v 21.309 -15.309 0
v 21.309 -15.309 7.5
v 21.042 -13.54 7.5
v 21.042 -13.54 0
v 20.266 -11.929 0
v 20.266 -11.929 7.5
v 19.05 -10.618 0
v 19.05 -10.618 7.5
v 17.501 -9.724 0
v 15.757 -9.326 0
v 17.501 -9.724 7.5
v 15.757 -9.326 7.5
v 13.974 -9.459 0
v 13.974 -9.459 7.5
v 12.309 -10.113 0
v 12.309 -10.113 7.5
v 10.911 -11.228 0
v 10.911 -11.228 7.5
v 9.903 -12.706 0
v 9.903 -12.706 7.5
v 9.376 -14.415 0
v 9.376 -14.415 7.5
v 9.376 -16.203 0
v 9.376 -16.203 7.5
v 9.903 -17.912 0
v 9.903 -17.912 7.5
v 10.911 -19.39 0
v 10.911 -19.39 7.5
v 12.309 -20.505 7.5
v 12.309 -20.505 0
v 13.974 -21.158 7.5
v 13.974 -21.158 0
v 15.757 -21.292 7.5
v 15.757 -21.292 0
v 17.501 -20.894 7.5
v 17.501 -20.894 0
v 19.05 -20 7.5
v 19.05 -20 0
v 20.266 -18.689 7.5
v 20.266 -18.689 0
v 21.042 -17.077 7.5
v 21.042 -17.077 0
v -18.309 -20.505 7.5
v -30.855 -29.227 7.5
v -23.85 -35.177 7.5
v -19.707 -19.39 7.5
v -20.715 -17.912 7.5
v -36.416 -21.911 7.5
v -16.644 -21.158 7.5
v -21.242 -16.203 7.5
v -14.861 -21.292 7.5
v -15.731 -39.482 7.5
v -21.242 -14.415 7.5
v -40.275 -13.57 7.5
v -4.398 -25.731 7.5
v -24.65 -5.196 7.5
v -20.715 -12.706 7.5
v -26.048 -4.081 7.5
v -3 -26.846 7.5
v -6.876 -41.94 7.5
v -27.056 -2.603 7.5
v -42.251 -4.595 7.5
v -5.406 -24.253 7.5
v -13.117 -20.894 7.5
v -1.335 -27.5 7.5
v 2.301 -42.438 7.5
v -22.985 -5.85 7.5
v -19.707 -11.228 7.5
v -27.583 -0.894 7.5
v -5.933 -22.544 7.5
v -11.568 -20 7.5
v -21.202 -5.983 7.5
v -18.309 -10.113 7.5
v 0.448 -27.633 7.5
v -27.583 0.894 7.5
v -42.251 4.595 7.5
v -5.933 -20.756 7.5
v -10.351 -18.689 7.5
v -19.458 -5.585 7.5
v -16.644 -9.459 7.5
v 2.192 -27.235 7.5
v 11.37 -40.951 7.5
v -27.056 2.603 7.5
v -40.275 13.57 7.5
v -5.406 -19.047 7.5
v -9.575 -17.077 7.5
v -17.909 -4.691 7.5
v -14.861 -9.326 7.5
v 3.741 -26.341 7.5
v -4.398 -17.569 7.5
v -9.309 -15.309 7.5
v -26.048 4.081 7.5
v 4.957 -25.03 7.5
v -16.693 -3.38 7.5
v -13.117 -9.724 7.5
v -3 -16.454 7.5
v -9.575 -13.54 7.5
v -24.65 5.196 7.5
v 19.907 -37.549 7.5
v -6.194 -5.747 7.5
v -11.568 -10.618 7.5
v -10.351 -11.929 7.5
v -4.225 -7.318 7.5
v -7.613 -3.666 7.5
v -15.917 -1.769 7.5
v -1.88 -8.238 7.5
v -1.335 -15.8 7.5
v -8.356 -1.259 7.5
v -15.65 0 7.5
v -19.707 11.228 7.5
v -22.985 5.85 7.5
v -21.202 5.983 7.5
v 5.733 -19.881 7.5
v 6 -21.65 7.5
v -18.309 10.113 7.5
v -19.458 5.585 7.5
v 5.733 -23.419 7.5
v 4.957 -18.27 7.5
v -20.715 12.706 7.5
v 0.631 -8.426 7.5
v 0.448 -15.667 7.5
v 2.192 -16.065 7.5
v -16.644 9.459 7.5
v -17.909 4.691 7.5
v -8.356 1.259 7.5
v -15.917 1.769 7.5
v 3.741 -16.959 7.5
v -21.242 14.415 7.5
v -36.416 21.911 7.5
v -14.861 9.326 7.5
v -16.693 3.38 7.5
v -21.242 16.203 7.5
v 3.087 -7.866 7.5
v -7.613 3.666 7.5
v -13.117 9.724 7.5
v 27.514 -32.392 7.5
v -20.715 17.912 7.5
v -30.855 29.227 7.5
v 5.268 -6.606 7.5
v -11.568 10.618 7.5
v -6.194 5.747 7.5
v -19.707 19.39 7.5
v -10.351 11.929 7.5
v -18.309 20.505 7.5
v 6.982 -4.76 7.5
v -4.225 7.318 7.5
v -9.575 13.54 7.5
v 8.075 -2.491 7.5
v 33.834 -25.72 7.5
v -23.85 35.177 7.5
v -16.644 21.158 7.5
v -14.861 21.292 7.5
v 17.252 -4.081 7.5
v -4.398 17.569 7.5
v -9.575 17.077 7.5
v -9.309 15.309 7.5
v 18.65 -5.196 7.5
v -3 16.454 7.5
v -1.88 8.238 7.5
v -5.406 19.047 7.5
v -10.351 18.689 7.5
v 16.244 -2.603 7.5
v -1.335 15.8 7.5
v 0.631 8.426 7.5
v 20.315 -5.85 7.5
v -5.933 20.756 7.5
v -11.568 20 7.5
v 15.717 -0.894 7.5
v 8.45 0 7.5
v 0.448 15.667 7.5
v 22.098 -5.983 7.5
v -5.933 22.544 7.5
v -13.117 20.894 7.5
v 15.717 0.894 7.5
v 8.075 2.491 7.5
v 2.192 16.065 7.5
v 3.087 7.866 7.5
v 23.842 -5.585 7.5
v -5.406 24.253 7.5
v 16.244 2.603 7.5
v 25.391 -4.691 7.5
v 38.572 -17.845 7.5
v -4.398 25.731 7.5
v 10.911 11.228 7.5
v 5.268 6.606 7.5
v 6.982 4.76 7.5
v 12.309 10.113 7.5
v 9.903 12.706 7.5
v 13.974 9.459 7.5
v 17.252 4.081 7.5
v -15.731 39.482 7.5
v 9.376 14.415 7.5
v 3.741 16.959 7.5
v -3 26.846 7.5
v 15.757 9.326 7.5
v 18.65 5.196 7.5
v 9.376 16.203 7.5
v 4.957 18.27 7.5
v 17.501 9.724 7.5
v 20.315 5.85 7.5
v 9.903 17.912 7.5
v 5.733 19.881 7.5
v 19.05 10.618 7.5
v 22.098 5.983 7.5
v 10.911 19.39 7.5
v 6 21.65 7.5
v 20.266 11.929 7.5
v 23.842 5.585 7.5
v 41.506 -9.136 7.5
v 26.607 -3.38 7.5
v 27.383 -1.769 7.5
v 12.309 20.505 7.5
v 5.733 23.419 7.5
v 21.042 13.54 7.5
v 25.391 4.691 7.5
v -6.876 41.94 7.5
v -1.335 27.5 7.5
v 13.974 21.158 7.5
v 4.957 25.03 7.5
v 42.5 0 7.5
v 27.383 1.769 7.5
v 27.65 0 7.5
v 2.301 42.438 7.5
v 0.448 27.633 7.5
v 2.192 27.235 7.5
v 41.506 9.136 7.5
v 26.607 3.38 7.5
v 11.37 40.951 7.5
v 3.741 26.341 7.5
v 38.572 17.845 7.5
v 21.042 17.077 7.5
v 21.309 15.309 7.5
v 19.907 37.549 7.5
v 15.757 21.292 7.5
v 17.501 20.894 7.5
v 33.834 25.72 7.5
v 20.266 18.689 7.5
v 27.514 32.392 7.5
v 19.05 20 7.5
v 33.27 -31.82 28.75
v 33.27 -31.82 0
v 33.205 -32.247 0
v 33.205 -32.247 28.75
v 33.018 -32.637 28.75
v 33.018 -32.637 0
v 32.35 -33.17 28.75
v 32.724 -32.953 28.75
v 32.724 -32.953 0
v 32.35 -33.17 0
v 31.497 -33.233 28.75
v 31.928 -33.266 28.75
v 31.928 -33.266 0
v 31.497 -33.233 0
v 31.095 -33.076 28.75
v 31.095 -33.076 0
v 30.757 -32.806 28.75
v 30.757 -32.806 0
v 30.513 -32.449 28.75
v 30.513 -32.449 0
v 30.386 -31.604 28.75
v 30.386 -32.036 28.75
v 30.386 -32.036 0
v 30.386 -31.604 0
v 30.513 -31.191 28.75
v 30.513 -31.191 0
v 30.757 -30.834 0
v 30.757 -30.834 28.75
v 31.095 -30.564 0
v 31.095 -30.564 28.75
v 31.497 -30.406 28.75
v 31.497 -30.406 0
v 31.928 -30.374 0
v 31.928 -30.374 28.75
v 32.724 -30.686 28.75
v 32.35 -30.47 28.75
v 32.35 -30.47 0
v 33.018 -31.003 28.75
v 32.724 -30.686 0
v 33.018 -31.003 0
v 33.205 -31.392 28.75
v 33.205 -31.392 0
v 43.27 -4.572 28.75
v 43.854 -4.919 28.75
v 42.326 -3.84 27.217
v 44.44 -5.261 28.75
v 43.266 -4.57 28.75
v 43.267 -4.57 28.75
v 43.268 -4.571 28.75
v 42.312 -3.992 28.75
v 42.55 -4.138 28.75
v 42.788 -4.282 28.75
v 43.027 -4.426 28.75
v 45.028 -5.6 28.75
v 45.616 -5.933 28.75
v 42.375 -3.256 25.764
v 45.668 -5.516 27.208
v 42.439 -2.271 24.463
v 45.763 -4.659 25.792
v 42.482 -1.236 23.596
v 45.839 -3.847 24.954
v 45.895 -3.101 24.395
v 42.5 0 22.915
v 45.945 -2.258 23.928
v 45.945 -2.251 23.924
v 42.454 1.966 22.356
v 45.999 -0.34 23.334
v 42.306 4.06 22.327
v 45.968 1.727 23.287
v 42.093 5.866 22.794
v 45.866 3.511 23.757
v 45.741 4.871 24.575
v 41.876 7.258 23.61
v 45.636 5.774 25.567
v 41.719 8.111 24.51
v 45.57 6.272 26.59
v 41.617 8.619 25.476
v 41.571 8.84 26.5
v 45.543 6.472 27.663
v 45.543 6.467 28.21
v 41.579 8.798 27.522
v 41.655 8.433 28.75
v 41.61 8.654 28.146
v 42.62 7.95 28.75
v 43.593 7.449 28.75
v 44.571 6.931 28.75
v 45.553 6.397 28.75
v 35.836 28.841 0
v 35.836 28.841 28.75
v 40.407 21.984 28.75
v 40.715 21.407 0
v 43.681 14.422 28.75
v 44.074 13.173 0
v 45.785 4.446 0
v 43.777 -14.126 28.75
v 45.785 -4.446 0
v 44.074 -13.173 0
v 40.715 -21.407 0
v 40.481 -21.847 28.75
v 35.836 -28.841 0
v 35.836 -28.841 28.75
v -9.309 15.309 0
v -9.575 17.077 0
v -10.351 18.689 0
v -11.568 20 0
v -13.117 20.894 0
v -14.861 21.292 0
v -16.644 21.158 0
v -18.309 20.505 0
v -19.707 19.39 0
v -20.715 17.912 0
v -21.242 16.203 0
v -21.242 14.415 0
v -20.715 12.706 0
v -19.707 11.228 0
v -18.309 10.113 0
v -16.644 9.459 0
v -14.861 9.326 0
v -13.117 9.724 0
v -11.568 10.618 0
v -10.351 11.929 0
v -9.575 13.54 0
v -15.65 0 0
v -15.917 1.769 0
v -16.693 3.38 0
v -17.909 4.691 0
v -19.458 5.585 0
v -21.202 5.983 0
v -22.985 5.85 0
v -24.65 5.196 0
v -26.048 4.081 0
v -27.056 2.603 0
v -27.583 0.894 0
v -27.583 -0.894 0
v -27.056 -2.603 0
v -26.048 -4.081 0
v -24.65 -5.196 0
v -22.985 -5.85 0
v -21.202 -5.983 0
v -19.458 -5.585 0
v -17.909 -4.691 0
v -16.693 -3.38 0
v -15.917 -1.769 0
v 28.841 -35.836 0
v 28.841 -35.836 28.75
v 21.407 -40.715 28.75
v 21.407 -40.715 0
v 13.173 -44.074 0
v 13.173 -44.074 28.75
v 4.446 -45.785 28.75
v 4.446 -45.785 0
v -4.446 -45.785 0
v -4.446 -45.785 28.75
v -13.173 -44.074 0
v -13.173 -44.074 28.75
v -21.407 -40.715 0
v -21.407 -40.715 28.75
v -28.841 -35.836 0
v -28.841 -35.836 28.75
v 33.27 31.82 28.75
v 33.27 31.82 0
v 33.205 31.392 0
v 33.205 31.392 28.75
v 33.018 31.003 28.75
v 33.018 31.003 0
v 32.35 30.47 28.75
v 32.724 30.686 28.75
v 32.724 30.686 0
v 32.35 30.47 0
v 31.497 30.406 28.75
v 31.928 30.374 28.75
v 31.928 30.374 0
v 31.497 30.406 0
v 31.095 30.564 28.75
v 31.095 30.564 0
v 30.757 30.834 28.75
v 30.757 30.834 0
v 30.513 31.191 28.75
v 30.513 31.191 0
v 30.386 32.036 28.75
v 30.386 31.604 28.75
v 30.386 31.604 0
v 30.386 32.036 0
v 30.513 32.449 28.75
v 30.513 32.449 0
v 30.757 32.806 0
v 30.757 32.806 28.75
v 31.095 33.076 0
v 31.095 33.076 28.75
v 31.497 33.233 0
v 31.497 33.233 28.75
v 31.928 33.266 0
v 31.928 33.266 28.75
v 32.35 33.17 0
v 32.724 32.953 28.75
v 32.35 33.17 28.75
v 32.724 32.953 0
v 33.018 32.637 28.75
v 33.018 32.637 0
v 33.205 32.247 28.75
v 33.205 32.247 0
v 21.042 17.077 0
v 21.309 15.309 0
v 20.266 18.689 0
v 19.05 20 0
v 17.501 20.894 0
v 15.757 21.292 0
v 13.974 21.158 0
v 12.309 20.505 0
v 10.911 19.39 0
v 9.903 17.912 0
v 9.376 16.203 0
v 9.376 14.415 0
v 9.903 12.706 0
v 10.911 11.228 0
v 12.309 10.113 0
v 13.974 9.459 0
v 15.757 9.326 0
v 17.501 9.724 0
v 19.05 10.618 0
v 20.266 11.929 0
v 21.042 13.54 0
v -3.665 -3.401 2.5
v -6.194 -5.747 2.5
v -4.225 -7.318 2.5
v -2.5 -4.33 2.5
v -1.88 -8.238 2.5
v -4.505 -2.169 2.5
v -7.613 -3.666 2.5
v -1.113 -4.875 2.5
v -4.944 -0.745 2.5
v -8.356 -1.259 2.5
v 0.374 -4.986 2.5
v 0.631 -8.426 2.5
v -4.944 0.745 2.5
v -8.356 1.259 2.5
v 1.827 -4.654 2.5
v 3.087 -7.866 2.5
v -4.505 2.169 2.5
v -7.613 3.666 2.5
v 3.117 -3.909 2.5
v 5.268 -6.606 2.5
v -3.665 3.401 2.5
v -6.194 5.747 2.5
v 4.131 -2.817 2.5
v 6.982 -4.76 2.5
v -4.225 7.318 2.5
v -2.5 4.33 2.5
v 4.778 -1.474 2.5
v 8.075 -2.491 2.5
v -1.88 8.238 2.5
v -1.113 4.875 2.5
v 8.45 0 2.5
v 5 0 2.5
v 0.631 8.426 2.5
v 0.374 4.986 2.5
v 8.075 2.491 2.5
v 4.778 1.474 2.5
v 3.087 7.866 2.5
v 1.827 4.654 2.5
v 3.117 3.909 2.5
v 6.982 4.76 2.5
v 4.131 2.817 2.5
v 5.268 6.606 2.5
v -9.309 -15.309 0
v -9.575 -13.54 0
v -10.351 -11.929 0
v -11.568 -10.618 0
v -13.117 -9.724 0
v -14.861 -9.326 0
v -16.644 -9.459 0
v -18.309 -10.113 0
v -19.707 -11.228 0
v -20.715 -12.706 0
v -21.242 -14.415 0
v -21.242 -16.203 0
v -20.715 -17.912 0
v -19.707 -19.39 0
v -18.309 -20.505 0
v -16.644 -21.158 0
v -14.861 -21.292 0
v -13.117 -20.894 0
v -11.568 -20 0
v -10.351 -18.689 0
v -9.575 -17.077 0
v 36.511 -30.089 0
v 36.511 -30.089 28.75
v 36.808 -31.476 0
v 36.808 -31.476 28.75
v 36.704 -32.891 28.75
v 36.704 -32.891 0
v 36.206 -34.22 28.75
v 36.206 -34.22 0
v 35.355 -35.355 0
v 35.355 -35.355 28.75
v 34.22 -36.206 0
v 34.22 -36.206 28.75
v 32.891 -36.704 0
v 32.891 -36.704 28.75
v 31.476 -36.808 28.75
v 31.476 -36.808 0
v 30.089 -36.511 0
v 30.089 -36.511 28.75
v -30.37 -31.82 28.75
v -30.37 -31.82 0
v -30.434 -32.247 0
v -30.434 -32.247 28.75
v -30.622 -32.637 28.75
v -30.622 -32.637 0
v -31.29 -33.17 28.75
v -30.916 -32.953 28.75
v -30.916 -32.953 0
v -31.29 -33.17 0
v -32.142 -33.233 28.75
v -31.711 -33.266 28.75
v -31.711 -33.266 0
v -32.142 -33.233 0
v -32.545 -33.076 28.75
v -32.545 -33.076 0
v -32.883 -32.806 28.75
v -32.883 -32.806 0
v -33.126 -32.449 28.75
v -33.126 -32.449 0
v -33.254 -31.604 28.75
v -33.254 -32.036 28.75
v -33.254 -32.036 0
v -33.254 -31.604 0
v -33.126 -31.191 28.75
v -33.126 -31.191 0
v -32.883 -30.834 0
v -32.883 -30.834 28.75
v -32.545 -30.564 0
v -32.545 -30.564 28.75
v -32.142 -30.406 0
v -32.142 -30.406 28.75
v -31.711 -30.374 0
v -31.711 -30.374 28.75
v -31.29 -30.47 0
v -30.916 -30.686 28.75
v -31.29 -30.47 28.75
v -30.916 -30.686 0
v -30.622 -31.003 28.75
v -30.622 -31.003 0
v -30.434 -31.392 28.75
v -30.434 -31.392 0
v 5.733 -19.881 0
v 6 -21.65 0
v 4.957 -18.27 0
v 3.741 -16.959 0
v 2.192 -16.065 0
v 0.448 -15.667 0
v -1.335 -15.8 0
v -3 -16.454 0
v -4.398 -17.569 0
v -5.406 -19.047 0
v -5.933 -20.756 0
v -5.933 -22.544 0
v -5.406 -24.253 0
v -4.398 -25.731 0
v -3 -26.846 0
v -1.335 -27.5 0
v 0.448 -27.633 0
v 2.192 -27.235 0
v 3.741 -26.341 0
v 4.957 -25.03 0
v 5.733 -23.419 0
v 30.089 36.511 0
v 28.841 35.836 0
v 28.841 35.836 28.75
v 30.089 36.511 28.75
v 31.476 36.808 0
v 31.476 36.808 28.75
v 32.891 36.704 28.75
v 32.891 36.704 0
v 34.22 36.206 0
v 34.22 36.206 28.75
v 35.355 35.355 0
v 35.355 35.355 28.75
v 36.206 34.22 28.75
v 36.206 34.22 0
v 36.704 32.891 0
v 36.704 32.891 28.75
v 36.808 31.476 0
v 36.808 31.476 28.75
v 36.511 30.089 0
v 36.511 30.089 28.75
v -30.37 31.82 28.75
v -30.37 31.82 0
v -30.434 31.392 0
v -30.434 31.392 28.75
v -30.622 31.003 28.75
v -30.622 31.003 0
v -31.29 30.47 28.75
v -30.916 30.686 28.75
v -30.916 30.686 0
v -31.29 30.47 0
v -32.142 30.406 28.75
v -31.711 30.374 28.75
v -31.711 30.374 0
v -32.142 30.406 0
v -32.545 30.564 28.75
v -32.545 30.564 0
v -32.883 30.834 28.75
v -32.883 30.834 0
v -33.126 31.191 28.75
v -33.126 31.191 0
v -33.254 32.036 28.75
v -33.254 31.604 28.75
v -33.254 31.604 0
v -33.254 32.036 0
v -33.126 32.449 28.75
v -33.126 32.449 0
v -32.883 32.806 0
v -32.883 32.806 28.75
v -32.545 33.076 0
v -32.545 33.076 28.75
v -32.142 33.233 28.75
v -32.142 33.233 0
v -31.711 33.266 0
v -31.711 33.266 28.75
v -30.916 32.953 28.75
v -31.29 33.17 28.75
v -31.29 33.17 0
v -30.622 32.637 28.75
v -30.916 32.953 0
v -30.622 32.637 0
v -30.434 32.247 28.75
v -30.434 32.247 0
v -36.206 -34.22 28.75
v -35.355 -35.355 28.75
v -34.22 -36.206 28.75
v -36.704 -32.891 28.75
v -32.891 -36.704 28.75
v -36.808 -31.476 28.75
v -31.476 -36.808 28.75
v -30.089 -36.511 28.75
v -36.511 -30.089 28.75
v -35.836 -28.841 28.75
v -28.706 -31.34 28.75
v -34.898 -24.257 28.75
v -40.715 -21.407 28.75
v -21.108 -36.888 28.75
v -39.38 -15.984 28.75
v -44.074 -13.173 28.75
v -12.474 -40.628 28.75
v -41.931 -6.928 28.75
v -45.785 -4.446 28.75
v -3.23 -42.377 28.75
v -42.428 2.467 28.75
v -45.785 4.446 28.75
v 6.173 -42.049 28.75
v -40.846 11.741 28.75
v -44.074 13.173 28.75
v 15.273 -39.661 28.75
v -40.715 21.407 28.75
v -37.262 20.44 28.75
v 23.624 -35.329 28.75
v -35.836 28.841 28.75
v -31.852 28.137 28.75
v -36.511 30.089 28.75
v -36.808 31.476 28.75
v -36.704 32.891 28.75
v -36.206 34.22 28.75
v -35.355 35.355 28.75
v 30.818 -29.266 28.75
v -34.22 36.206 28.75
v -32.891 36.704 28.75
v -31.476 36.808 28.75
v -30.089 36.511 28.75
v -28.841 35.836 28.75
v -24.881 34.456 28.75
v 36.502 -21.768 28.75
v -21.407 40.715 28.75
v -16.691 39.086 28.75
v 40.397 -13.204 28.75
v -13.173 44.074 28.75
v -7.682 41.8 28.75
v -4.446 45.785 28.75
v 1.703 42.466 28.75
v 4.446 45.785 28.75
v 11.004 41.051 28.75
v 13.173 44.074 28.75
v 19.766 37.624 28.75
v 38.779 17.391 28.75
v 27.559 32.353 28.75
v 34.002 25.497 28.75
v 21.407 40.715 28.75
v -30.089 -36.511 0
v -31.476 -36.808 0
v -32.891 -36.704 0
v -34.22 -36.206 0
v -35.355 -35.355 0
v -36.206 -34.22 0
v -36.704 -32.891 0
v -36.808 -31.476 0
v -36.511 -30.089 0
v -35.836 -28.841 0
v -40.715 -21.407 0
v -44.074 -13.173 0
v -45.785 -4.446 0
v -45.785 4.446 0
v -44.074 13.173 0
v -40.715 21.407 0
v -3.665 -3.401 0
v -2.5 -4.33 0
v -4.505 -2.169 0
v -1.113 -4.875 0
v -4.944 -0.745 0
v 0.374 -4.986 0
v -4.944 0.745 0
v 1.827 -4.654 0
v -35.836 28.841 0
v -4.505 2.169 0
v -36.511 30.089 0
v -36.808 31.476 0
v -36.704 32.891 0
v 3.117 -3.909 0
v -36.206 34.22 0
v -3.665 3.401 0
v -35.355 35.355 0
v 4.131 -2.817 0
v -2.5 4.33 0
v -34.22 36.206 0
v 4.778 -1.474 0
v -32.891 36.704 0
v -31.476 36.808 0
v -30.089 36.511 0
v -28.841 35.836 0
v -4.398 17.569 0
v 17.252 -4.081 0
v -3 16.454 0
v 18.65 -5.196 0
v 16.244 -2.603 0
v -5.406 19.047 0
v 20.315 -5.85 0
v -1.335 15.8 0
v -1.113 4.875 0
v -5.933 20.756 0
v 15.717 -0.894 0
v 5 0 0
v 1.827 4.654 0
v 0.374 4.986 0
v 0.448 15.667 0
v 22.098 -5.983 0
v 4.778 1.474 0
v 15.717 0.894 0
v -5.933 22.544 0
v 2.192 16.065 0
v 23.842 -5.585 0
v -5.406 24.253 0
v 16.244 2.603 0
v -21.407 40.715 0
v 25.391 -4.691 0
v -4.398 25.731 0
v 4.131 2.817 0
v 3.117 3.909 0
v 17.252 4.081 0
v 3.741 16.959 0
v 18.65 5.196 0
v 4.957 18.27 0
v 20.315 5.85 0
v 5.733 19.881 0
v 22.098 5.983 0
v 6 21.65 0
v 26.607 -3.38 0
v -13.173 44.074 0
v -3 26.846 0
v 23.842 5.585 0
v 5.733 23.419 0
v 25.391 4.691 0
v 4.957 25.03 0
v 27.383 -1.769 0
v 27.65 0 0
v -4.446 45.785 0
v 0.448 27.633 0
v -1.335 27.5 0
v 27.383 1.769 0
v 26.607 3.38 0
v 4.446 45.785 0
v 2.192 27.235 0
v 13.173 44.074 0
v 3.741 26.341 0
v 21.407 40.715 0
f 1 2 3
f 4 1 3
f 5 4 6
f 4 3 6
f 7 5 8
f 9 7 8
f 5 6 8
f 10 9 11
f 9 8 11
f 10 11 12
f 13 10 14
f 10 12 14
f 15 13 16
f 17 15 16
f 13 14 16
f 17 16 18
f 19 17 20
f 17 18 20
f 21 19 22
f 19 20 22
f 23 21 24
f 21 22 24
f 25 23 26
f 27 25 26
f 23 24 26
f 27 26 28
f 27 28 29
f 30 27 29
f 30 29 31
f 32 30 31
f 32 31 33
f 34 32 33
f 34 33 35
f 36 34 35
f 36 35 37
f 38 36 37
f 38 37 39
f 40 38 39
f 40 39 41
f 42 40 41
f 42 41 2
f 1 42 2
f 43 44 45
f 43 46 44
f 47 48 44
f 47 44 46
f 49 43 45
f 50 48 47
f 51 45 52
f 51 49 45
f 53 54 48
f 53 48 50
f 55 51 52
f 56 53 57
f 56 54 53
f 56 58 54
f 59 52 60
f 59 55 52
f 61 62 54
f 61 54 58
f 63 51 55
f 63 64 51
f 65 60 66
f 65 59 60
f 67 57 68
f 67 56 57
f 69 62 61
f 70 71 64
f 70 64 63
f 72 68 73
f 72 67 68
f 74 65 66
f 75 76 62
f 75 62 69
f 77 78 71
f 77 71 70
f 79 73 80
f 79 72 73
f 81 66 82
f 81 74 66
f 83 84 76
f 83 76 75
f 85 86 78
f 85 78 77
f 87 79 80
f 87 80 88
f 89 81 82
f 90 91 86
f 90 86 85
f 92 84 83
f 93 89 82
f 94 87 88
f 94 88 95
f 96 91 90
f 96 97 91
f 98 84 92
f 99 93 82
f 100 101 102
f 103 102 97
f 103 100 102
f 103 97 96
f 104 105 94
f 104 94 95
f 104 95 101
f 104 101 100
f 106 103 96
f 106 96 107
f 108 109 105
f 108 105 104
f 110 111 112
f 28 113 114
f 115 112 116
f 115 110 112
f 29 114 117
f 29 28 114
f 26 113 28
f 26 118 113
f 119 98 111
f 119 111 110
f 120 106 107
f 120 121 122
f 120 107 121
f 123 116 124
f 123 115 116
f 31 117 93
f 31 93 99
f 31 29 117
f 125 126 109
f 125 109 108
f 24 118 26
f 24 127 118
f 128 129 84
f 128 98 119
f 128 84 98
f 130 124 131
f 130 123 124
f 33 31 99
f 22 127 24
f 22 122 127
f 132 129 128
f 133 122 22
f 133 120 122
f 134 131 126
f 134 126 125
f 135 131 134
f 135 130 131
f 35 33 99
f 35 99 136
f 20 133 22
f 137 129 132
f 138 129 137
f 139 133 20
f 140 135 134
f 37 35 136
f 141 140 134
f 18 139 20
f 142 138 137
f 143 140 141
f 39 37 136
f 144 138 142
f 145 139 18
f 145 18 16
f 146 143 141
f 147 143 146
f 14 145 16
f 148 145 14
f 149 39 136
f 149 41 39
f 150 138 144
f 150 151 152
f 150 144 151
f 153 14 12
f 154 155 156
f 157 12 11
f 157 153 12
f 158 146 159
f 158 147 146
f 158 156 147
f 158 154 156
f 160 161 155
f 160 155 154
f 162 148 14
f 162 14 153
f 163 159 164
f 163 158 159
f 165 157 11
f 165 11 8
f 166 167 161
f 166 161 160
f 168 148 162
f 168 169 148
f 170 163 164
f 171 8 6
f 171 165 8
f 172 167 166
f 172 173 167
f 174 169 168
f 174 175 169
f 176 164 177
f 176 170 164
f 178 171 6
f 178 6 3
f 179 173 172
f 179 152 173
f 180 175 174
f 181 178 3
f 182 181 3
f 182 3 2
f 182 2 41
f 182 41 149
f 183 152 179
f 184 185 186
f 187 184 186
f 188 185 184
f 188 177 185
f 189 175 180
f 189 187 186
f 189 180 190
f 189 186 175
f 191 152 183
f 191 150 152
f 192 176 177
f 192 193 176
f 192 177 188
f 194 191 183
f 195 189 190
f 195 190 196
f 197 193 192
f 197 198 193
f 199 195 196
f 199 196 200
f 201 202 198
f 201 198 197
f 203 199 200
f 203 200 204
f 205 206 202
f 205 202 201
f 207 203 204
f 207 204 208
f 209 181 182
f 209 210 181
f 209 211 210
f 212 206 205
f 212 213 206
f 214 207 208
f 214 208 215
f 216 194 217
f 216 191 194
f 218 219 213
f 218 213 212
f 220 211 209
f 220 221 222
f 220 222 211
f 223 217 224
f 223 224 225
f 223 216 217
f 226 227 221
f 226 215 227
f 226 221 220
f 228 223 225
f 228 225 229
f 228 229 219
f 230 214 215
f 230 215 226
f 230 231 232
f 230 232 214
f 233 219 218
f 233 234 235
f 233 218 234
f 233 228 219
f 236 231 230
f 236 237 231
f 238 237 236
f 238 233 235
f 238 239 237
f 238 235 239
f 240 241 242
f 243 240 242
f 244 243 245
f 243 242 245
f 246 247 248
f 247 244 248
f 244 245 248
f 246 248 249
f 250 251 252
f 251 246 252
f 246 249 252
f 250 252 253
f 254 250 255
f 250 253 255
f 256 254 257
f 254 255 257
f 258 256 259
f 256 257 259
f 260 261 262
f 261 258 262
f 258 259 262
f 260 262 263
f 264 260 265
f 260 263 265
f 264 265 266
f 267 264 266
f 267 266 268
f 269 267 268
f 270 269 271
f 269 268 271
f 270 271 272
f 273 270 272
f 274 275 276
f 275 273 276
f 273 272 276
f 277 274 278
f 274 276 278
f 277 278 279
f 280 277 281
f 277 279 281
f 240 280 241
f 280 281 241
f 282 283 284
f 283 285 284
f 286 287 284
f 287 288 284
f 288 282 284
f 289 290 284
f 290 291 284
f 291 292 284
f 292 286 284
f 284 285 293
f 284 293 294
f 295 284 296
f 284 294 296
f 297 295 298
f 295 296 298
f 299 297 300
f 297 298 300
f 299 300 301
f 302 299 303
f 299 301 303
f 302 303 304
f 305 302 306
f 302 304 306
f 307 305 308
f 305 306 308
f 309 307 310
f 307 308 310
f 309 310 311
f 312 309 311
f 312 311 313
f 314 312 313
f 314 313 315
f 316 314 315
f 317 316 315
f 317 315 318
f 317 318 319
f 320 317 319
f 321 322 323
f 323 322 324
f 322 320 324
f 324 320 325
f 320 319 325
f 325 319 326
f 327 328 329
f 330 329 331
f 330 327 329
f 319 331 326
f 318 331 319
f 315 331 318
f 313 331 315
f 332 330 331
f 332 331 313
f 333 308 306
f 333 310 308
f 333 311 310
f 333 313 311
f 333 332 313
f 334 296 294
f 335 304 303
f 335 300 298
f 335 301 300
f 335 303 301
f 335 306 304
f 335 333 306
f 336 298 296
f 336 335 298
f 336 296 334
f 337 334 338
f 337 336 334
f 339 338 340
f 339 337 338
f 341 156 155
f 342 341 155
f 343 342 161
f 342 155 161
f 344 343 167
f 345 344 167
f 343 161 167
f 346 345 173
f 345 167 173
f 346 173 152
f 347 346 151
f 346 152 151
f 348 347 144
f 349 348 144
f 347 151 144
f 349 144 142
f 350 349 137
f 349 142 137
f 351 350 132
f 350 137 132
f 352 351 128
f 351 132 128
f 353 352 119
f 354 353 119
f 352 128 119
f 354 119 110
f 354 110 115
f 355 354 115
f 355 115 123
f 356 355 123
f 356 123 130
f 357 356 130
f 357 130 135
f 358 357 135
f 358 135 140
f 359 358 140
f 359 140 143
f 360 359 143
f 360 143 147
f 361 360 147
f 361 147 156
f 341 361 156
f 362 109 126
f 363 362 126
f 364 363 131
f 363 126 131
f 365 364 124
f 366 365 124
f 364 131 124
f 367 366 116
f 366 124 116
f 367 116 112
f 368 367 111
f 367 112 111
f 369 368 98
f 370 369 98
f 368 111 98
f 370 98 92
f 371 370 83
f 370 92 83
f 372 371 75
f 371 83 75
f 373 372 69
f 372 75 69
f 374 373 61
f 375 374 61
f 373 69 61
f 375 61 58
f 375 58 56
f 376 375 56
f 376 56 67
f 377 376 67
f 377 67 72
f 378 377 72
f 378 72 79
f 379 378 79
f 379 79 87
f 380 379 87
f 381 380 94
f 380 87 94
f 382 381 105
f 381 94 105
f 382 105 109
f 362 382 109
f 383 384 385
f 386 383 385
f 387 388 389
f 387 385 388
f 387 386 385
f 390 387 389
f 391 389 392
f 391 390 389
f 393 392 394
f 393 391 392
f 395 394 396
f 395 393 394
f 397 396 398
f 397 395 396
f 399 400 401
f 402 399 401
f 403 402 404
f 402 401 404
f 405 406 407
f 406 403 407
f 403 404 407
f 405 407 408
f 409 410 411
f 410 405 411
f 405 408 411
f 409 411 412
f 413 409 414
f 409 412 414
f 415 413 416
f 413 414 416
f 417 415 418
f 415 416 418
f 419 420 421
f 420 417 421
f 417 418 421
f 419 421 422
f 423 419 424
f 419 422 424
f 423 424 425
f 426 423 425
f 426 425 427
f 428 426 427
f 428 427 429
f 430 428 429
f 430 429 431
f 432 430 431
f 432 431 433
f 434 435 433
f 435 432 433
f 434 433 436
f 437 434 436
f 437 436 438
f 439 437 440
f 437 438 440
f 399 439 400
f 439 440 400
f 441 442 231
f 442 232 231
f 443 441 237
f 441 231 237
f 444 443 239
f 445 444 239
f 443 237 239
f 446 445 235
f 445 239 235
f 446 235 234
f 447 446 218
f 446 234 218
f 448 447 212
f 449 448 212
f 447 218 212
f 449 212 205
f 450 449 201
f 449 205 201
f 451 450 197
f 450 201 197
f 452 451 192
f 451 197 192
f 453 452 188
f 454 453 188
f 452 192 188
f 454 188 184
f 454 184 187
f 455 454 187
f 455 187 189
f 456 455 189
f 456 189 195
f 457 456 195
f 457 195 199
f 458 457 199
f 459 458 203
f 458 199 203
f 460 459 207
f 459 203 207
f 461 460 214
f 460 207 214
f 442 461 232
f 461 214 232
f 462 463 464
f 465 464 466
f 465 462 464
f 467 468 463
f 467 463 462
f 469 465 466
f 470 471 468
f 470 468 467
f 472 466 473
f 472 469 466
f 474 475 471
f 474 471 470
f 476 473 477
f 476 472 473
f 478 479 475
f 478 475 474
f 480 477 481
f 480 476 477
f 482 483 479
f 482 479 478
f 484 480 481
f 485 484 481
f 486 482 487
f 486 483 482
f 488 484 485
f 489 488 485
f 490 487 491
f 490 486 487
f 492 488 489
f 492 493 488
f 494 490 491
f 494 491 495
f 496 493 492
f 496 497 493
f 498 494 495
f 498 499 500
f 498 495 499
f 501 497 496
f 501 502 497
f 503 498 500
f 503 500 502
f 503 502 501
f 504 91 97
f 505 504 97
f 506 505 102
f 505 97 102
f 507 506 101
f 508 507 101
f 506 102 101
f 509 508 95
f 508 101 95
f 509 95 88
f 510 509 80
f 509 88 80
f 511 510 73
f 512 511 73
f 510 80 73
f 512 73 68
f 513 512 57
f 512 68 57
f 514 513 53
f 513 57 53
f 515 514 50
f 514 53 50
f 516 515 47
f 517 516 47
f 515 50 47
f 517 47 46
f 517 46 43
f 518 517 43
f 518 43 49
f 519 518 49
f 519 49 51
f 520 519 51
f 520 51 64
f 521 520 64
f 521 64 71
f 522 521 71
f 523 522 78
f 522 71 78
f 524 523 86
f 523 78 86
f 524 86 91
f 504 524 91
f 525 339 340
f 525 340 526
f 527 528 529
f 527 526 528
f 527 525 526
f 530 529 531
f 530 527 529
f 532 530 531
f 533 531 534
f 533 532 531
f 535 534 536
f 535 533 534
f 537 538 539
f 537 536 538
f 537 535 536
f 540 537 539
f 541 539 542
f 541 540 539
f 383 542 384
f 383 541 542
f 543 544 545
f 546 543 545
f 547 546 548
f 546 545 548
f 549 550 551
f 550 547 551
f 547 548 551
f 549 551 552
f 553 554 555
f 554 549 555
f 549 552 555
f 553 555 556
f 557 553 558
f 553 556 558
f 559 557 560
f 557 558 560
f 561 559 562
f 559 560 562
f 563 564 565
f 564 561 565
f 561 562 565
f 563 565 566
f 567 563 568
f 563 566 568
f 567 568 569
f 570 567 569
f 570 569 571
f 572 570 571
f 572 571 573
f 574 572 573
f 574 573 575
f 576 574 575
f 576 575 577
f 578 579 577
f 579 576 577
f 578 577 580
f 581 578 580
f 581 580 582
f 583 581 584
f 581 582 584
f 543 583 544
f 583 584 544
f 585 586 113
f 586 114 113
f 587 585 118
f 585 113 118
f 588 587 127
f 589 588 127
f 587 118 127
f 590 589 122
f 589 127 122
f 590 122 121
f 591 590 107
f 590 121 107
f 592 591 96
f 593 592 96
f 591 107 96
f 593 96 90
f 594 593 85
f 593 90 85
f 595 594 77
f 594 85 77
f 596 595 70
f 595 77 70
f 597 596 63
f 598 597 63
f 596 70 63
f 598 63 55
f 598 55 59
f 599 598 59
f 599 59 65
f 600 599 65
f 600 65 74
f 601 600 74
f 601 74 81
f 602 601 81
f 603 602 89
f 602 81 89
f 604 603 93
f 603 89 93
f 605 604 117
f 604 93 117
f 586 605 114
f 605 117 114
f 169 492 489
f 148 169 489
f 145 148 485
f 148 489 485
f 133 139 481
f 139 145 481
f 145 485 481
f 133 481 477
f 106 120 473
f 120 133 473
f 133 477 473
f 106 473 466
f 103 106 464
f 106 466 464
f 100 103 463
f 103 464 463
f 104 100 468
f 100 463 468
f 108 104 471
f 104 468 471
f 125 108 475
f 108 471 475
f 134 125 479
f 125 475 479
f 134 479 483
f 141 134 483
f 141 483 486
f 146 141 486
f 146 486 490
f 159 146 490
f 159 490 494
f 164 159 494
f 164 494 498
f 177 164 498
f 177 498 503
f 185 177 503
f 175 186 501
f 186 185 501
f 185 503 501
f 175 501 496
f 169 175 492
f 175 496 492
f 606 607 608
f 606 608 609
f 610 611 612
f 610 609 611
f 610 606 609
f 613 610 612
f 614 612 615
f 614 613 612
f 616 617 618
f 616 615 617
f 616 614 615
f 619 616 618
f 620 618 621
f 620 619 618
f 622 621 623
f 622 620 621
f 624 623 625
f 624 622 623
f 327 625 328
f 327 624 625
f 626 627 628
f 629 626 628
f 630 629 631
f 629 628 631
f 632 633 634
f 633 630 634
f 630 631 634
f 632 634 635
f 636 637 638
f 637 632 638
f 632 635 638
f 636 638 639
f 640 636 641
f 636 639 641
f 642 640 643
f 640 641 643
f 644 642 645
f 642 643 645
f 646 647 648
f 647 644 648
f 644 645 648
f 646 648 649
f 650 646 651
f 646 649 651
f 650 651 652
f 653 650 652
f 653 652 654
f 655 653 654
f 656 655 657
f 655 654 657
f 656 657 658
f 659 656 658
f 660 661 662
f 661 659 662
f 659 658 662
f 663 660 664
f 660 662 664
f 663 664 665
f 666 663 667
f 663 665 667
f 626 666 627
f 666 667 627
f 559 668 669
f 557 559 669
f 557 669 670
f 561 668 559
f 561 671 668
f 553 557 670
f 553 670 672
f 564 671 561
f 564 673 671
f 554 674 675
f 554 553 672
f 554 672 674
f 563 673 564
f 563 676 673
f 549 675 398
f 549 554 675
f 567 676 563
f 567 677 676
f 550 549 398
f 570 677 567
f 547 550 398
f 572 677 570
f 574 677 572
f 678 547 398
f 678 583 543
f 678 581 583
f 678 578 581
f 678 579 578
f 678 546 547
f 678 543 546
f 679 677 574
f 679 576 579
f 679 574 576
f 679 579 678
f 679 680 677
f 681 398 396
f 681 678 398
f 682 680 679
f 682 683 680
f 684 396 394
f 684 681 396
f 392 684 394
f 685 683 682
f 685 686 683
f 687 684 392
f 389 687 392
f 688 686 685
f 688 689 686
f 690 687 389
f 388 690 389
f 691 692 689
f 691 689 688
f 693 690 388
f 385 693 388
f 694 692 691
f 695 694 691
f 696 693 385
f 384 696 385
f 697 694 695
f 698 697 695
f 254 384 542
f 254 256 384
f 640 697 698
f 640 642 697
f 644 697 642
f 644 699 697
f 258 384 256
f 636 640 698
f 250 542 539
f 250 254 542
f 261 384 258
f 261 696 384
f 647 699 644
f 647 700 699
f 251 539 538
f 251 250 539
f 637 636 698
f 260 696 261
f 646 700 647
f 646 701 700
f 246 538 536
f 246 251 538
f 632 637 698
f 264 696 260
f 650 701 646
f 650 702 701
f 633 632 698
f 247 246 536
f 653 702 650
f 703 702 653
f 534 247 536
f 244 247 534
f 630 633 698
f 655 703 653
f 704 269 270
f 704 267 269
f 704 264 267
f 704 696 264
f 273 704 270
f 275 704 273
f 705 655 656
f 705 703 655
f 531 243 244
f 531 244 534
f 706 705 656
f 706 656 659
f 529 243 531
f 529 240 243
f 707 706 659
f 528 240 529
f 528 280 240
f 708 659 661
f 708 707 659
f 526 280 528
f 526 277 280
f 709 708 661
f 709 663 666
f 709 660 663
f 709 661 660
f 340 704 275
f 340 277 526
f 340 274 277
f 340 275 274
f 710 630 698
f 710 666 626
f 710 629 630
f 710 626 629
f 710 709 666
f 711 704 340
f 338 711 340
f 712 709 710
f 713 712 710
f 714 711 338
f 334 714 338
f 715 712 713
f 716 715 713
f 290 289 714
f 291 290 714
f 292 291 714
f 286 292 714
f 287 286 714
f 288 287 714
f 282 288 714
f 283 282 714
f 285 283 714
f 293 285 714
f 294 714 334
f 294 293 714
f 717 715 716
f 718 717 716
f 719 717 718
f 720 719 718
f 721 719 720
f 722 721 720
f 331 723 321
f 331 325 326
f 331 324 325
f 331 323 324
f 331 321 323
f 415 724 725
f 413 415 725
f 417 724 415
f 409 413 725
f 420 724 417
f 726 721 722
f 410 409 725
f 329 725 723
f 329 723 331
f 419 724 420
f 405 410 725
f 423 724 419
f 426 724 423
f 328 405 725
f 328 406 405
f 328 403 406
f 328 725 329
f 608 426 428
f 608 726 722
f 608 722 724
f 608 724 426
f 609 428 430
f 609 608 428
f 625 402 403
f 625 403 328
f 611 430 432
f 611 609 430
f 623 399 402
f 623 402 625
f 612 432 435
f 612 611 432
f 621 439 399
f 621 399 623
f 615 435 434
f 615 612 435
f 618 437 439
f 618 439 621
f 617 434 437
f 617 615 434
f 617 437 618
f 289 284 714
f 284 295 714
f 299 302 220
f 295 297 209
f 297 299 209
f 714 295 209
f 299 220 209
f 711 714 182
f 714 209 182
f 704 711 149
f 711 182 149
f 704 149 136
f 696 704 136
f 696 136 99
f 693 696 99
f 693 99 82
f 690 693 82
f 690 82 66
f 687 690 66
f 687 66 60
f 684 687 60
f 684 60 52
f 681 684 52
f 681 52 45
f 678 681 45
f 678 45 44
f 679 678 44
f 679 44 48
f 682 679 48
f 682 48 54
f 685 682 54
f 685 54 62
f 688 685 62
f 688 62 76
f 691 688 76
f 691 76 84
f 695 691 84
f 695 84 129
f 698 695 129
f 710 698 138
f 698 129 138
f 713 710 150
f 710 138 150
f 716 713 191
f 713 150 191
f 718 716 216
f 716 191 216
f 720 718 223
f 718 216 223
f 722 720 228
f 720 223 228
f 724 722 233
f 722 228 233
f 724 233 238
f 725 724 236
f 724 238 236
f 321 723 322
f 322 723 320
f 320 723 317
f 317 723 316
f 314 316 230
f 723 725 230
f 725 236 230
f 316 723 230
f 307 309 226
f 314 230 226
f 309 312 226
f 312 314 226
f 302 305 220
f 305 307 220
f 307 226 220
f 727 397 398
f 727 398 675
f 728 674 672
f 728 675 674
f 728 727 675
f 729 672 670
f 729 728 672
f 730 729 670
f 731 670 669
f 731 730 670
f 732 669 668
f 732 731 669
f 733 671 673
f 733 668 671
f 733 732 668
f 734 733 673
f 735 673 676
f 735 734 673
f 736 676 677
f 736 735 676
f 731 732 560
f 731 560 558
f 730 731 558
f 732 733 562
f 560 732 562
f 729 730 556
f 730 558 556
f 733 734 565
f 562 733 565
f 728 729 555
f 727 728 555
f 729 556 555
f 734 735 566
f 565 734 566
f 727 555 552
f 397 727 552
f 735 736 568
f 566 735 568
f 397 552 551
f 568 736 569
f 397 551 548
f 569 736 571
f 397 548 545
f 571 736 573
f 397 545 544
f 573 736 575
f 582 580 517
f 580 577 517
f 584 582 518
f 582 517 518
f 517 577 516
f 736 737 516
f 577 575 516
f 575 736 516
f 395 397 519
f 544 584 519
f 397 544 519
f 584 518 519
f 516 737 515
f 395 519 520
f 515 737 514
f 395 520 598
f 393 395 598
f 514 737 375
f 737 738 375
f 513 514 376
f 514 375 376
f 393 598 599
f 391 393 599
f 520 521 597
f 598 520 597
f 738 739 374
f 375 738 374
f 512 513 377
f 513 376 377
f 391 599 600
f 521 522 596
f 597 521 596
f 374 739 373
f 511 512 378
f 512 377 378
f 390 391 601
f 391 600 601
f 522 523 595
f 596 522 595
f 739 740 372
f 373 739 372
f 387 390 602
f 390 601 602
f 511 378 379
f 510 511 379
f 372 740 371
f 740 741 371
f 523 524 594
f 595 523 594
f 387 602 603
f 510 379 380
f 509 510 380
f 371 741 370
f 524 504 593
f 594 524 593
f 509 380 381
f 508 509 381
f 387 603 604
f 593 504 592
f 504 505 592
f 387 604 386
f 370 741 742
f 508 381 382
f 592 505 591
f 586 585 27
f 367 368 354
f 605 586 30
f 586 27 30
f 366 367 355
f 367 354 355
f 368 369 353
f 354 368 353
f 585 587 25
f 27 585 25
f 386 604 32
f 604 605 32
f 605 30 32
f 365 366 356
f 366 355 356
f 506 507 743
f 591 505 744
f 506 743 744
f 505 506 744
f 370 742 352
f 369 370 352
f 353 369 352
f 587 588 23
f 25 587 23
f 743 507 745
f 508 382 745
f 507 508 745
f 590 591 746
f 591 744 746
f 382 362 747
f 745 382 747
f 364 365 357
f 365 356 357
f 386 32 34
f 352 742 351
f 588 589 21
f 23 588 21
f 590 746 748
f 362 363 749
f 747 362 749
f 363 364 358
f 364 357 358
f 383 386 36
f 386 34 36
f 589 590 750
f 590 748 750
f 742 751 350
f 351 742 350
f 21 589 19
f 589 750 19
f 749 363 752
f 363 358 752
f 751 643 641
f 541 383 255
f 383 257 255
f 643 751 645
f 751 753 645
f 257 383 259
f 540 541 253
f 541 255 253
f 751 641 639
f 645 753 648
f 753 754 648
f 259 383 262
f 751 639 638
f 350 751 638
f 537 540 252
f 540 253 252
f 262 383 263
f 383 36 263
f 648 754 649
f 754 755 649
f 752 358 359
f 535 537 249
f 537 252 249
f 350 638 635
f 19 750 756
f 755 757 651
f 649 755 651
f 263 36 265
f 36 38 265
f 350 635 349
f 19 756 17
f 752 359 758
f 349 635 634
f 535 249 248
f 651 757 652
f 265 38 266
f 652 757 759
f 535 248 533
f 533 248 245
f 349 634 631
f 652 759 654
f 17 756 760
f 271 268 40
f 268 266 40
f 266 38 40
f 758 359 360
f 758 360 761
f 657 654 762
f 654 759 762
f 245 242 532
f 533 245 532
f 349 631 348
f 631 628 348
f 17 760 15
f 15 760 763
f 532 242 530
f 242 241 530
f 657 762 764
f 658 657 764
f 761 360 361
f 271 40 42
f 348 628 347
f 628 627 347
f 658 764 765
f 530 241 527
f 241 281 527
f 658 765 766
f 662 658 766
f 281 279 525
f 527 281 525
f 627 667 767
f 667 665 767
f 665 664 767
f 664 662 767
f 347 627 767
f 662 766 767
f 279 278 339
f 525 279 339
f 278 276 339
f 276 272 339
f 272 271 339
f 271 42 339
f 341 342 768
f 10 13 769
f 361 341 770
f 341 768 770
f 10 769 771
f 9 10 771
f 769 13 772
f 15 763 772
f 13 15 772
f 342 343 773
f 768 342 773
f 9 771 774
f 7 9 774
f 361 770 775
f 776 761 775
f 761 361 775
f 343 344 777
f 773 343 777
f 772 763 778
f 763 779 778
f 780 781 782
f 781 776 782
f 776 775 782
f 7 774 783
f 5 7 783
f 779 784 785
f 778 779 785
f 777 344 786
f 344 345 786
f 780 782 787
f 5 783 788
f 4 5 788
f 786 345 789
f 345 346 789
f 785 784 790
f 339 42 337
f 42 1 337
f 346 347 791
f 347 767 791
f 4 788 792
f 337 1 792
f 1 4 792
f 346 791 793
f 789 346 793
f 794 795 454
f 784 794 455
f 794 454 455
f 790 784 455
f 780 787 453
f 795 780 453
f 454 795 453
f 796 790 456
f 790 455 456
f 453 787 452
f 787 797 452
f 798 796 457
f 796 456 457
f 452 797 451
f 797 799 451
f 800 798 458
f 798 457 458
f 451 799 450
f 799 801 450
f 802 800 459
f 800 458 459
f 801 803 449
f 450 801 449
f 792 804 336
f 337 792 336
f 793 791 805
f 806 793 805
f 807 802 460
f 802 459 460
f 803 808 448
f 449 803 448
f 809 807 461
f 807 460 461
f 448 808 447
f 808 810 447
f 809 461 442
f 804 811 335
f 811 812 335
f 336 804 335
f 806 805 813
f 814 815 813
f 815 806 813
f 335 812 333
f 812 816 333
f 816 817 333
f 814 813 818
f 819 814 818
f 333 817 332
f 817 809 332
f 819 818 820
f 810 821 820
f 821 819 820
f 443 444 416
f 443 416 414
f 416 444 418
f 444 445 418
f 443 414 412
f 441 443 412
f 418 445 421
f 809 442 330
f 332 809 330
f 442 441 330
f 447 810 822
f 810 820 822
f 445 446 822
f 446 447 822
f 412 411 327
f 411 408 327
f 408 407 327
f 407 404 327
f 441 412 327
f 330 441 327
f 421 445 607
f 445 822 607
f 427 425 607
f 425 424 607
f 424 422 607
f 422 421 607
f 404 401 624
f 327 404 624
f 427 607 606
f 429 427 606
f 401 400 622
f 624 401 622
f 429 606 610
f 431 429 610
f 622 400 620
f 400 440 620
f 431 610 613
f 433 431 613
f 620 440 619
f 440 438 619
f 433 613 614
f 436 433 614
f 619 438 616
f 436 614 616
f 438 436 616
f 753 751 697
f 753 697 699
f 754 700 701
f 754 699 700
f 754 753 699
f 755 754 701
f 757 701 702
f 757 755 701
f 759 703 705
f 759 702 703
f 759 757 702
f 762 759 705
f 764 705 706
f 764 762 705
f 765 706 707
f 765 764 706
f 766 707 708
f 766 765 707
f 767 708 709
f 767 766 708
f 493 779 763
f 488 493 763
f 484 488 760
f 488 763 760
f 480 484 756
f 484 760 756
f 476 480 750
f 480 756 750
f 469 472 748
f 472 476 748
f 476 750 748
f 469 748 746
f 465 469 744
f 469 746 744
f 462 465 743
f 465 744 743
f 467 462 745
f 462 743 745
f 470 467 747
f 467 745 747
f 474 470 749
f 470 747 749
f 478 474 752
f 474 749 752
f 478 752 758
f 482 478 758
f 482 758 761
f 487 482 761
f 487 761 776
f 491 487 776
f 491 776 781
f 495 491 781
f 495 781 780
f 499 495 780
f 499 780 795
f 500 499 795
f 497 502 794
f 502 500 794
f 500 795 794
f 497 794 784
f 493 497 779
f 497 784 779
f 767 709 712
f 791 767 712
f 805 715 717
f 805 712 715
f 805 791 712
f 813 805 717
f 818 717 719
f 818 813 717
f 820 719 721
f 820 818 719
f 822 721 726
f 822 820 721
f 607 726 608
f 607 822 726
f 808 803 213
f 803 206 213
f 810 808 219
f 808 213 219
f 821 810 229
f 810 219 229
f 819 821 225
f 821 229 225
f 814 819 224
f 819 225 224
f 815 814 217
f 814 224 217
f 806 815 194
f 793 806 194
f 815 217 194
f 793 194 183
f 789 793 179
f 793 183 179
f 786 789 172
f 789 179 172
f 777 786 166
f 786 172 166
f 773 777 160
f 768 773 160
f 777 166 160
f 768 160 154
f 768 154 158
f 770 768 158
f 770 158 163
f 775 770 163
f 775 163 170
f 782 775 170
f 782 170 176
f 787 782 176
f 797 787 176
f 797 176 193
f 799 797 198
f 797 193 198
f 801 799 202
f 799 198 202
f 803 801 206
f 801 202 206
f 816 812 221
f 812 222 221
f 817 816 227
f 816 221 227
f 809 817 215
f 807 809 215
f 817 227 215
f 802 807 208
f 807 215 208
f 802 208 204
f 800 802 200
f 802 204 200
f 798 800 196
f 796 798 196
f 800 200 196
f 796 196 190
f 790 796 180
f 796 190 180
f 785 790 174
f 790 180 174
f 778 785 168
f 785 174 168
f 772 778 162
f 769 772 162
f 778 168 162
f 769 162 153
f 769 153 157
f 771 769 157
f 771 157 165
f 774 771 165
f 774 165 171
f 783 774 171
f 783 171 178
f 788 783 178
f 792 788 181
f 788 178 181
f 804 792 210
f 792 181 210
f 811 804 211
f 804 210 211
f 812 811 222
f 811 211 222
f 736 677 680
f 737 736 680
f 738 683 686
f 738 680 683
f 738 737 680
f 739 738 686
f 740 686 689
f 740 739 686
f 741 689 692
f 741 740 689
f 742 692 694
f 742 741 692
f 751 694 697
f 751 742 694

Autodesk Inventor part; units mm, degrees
ref_plane "YZ Plane" through (0, 0, 0) normal (1, 0, 0) x (0, 1, 0)
ref_plane "XZ Plane" through (0, 0, 0) normal (0, 1, 0) x (-1, 0, 0)
sketch "Sketch1" plane through (0, 0, 0) normal (0, 0, 1) x (1, 0, 0)
  circle A0 centre (0, 0) radius 5
  circle A1 centre (0, 0) radius 8.45
  circle A2 centre (0, 0) radius 42.5
  circle A3 centre (0, 0) radius 45 construction
  circle A4 centre (-31.8198, 31.8198) radius 1.45
  arc A5 (-28.0933, 35.1535) -> (-35.1535, 28.0933) centre (-31.8198, 31.8198) ccw
  arc A6 (-35.1535, -28.0933) -> (-28.0933, -35.1535) centre (-31.8198, -31.8198) ccw
  circle A7 centre (-31.8198, -31.8198) radius 1.45
  arc A8 (28.0933, -35.1535) -> (35.1535, -28.0933) centre (31.8198, -31.8198) ccw
  circle A9 centre (31.8198, -31.8198) radius 1.45
  arc A10 (35.1535, 28.0933) -> (28.0933, 35.1535) centre (31.8198, 31.8198) ccw
  circle A11 centre (31.8198, 31.8198) radius 1.45
  line L0 (-31.8198, 31.8198) -> (31.8198, 31.8198) construction
  arc A12 (28.841, 35.8357) -> (-28.841, 35.8357) centre (0, 0) ccw
  arc A13 (-35.8357, 28.841) -> (-35.8357, -28.841) centre (0, 0) ccw
  arc A14 (-28.841, -35.8357) -> (28.841, -35.8357) centre (0, 0) ccw
  arc A15 (35.8357, -28.841) -> (35.8357, 28.841) centre (0, 0) ccw
  point P0 (0, -46)
  point P1 (0, 46)
  dimension "d2" = 10
  dimension "d3" = 16.9
  dimension "d4" = 85
  dimension "d5" = 90
  dimension "d6" = 2.9
  dimension "d7" = 5
  dimension "d8" = 360
  dimension "d9" = 92
extrude "Extrusion1" add sketch "Sketch1" along normal blind 2.5 contours A1
extrude "Extrusion2" add sketch "Sketch1" along normal blind 7.5 contours A2
extrude "Extrusion3" add sketch "Sketch1" along normal blind 28.75 contours A12 A10 A15 A8 A14 A6 A13 A5
sketch "Sketch2" plane through (0, 0, 28.75) normal (0, 0, 1) x (1, 0, 0)
  arc A0 (35.8357, -28.841) -> (35.8357, 28.841) centre (0, 0) ccw construction
  line L0 (46, 0) -> (46, -31.8198) construction
  point P0 (31.8198, -31.8198)
ref_plane "Work Plane1" through (46, 0, 28.75) normal (0.9659, 0, 0.2588) x (0, -1, 0)
sketch "Sketch3" plane through (46, 0, 28.75) normal (0.9659, 0, 0.2588) x (0, -1, 0)
  ellipse E0 centre (0, -11.9057) end of major axis (-46, -11.9057) minor radius 11.9057 (28.841, -2.6307) -> (-28.841, -2.6307) ccw projected
  line L0 (0, 0) -> (0, -11.9057) construction
  point P0 (0, 15.8647)
ref_plane "Work Plane2" through (46, 0, 28.75) normal (0.8365, -0.5, 0.2241) x (-0.2588, 0, 0.9659)
sketch "Sketch4" plane through (46, 0, 28.75) normal (0.8365, -0.5, 0.2241) x (-0.2588, 0, 0.9659)
  circle A0 centre (0, 0) radius 5.325
  point P0 (-15.8647, 25.9368)
  dimension "d18" = 10.65
extrude "Extrusion4" cut sketch "Sketch4" along normal mid plane 30
sketch "Sketch5" plane through (0, 0, 7.5) normal (0, 0, 1) x (1, 0, 0)
  circle A0 centre (0, 21.65) radius 6
  line L0 (0, 21.65) -> (0, 0)
  circle A1 centre (-15.3089, 15.3089) radius 6
  circle A2 centre (-21.65, 0) radius 6
  circle A3 centre (-15.3089, -15.3089) radius 6
  circle A4 centre (0, -21.65) radius 6
  circle A5 centre (15.3089, -15.3089) radius 6
  circle A6 centre (21.65, 0) radius 6
  circle A7 centre (15.3089, 15.3089) radius 6
  dimension "d21" = 12
  dimension "d22" = 21.65
  dimension "d25" = 360
extrude "Extrusion5" cut sketch "Sketch5" against normal through all
properties part number "Case Part 1 - V3"
